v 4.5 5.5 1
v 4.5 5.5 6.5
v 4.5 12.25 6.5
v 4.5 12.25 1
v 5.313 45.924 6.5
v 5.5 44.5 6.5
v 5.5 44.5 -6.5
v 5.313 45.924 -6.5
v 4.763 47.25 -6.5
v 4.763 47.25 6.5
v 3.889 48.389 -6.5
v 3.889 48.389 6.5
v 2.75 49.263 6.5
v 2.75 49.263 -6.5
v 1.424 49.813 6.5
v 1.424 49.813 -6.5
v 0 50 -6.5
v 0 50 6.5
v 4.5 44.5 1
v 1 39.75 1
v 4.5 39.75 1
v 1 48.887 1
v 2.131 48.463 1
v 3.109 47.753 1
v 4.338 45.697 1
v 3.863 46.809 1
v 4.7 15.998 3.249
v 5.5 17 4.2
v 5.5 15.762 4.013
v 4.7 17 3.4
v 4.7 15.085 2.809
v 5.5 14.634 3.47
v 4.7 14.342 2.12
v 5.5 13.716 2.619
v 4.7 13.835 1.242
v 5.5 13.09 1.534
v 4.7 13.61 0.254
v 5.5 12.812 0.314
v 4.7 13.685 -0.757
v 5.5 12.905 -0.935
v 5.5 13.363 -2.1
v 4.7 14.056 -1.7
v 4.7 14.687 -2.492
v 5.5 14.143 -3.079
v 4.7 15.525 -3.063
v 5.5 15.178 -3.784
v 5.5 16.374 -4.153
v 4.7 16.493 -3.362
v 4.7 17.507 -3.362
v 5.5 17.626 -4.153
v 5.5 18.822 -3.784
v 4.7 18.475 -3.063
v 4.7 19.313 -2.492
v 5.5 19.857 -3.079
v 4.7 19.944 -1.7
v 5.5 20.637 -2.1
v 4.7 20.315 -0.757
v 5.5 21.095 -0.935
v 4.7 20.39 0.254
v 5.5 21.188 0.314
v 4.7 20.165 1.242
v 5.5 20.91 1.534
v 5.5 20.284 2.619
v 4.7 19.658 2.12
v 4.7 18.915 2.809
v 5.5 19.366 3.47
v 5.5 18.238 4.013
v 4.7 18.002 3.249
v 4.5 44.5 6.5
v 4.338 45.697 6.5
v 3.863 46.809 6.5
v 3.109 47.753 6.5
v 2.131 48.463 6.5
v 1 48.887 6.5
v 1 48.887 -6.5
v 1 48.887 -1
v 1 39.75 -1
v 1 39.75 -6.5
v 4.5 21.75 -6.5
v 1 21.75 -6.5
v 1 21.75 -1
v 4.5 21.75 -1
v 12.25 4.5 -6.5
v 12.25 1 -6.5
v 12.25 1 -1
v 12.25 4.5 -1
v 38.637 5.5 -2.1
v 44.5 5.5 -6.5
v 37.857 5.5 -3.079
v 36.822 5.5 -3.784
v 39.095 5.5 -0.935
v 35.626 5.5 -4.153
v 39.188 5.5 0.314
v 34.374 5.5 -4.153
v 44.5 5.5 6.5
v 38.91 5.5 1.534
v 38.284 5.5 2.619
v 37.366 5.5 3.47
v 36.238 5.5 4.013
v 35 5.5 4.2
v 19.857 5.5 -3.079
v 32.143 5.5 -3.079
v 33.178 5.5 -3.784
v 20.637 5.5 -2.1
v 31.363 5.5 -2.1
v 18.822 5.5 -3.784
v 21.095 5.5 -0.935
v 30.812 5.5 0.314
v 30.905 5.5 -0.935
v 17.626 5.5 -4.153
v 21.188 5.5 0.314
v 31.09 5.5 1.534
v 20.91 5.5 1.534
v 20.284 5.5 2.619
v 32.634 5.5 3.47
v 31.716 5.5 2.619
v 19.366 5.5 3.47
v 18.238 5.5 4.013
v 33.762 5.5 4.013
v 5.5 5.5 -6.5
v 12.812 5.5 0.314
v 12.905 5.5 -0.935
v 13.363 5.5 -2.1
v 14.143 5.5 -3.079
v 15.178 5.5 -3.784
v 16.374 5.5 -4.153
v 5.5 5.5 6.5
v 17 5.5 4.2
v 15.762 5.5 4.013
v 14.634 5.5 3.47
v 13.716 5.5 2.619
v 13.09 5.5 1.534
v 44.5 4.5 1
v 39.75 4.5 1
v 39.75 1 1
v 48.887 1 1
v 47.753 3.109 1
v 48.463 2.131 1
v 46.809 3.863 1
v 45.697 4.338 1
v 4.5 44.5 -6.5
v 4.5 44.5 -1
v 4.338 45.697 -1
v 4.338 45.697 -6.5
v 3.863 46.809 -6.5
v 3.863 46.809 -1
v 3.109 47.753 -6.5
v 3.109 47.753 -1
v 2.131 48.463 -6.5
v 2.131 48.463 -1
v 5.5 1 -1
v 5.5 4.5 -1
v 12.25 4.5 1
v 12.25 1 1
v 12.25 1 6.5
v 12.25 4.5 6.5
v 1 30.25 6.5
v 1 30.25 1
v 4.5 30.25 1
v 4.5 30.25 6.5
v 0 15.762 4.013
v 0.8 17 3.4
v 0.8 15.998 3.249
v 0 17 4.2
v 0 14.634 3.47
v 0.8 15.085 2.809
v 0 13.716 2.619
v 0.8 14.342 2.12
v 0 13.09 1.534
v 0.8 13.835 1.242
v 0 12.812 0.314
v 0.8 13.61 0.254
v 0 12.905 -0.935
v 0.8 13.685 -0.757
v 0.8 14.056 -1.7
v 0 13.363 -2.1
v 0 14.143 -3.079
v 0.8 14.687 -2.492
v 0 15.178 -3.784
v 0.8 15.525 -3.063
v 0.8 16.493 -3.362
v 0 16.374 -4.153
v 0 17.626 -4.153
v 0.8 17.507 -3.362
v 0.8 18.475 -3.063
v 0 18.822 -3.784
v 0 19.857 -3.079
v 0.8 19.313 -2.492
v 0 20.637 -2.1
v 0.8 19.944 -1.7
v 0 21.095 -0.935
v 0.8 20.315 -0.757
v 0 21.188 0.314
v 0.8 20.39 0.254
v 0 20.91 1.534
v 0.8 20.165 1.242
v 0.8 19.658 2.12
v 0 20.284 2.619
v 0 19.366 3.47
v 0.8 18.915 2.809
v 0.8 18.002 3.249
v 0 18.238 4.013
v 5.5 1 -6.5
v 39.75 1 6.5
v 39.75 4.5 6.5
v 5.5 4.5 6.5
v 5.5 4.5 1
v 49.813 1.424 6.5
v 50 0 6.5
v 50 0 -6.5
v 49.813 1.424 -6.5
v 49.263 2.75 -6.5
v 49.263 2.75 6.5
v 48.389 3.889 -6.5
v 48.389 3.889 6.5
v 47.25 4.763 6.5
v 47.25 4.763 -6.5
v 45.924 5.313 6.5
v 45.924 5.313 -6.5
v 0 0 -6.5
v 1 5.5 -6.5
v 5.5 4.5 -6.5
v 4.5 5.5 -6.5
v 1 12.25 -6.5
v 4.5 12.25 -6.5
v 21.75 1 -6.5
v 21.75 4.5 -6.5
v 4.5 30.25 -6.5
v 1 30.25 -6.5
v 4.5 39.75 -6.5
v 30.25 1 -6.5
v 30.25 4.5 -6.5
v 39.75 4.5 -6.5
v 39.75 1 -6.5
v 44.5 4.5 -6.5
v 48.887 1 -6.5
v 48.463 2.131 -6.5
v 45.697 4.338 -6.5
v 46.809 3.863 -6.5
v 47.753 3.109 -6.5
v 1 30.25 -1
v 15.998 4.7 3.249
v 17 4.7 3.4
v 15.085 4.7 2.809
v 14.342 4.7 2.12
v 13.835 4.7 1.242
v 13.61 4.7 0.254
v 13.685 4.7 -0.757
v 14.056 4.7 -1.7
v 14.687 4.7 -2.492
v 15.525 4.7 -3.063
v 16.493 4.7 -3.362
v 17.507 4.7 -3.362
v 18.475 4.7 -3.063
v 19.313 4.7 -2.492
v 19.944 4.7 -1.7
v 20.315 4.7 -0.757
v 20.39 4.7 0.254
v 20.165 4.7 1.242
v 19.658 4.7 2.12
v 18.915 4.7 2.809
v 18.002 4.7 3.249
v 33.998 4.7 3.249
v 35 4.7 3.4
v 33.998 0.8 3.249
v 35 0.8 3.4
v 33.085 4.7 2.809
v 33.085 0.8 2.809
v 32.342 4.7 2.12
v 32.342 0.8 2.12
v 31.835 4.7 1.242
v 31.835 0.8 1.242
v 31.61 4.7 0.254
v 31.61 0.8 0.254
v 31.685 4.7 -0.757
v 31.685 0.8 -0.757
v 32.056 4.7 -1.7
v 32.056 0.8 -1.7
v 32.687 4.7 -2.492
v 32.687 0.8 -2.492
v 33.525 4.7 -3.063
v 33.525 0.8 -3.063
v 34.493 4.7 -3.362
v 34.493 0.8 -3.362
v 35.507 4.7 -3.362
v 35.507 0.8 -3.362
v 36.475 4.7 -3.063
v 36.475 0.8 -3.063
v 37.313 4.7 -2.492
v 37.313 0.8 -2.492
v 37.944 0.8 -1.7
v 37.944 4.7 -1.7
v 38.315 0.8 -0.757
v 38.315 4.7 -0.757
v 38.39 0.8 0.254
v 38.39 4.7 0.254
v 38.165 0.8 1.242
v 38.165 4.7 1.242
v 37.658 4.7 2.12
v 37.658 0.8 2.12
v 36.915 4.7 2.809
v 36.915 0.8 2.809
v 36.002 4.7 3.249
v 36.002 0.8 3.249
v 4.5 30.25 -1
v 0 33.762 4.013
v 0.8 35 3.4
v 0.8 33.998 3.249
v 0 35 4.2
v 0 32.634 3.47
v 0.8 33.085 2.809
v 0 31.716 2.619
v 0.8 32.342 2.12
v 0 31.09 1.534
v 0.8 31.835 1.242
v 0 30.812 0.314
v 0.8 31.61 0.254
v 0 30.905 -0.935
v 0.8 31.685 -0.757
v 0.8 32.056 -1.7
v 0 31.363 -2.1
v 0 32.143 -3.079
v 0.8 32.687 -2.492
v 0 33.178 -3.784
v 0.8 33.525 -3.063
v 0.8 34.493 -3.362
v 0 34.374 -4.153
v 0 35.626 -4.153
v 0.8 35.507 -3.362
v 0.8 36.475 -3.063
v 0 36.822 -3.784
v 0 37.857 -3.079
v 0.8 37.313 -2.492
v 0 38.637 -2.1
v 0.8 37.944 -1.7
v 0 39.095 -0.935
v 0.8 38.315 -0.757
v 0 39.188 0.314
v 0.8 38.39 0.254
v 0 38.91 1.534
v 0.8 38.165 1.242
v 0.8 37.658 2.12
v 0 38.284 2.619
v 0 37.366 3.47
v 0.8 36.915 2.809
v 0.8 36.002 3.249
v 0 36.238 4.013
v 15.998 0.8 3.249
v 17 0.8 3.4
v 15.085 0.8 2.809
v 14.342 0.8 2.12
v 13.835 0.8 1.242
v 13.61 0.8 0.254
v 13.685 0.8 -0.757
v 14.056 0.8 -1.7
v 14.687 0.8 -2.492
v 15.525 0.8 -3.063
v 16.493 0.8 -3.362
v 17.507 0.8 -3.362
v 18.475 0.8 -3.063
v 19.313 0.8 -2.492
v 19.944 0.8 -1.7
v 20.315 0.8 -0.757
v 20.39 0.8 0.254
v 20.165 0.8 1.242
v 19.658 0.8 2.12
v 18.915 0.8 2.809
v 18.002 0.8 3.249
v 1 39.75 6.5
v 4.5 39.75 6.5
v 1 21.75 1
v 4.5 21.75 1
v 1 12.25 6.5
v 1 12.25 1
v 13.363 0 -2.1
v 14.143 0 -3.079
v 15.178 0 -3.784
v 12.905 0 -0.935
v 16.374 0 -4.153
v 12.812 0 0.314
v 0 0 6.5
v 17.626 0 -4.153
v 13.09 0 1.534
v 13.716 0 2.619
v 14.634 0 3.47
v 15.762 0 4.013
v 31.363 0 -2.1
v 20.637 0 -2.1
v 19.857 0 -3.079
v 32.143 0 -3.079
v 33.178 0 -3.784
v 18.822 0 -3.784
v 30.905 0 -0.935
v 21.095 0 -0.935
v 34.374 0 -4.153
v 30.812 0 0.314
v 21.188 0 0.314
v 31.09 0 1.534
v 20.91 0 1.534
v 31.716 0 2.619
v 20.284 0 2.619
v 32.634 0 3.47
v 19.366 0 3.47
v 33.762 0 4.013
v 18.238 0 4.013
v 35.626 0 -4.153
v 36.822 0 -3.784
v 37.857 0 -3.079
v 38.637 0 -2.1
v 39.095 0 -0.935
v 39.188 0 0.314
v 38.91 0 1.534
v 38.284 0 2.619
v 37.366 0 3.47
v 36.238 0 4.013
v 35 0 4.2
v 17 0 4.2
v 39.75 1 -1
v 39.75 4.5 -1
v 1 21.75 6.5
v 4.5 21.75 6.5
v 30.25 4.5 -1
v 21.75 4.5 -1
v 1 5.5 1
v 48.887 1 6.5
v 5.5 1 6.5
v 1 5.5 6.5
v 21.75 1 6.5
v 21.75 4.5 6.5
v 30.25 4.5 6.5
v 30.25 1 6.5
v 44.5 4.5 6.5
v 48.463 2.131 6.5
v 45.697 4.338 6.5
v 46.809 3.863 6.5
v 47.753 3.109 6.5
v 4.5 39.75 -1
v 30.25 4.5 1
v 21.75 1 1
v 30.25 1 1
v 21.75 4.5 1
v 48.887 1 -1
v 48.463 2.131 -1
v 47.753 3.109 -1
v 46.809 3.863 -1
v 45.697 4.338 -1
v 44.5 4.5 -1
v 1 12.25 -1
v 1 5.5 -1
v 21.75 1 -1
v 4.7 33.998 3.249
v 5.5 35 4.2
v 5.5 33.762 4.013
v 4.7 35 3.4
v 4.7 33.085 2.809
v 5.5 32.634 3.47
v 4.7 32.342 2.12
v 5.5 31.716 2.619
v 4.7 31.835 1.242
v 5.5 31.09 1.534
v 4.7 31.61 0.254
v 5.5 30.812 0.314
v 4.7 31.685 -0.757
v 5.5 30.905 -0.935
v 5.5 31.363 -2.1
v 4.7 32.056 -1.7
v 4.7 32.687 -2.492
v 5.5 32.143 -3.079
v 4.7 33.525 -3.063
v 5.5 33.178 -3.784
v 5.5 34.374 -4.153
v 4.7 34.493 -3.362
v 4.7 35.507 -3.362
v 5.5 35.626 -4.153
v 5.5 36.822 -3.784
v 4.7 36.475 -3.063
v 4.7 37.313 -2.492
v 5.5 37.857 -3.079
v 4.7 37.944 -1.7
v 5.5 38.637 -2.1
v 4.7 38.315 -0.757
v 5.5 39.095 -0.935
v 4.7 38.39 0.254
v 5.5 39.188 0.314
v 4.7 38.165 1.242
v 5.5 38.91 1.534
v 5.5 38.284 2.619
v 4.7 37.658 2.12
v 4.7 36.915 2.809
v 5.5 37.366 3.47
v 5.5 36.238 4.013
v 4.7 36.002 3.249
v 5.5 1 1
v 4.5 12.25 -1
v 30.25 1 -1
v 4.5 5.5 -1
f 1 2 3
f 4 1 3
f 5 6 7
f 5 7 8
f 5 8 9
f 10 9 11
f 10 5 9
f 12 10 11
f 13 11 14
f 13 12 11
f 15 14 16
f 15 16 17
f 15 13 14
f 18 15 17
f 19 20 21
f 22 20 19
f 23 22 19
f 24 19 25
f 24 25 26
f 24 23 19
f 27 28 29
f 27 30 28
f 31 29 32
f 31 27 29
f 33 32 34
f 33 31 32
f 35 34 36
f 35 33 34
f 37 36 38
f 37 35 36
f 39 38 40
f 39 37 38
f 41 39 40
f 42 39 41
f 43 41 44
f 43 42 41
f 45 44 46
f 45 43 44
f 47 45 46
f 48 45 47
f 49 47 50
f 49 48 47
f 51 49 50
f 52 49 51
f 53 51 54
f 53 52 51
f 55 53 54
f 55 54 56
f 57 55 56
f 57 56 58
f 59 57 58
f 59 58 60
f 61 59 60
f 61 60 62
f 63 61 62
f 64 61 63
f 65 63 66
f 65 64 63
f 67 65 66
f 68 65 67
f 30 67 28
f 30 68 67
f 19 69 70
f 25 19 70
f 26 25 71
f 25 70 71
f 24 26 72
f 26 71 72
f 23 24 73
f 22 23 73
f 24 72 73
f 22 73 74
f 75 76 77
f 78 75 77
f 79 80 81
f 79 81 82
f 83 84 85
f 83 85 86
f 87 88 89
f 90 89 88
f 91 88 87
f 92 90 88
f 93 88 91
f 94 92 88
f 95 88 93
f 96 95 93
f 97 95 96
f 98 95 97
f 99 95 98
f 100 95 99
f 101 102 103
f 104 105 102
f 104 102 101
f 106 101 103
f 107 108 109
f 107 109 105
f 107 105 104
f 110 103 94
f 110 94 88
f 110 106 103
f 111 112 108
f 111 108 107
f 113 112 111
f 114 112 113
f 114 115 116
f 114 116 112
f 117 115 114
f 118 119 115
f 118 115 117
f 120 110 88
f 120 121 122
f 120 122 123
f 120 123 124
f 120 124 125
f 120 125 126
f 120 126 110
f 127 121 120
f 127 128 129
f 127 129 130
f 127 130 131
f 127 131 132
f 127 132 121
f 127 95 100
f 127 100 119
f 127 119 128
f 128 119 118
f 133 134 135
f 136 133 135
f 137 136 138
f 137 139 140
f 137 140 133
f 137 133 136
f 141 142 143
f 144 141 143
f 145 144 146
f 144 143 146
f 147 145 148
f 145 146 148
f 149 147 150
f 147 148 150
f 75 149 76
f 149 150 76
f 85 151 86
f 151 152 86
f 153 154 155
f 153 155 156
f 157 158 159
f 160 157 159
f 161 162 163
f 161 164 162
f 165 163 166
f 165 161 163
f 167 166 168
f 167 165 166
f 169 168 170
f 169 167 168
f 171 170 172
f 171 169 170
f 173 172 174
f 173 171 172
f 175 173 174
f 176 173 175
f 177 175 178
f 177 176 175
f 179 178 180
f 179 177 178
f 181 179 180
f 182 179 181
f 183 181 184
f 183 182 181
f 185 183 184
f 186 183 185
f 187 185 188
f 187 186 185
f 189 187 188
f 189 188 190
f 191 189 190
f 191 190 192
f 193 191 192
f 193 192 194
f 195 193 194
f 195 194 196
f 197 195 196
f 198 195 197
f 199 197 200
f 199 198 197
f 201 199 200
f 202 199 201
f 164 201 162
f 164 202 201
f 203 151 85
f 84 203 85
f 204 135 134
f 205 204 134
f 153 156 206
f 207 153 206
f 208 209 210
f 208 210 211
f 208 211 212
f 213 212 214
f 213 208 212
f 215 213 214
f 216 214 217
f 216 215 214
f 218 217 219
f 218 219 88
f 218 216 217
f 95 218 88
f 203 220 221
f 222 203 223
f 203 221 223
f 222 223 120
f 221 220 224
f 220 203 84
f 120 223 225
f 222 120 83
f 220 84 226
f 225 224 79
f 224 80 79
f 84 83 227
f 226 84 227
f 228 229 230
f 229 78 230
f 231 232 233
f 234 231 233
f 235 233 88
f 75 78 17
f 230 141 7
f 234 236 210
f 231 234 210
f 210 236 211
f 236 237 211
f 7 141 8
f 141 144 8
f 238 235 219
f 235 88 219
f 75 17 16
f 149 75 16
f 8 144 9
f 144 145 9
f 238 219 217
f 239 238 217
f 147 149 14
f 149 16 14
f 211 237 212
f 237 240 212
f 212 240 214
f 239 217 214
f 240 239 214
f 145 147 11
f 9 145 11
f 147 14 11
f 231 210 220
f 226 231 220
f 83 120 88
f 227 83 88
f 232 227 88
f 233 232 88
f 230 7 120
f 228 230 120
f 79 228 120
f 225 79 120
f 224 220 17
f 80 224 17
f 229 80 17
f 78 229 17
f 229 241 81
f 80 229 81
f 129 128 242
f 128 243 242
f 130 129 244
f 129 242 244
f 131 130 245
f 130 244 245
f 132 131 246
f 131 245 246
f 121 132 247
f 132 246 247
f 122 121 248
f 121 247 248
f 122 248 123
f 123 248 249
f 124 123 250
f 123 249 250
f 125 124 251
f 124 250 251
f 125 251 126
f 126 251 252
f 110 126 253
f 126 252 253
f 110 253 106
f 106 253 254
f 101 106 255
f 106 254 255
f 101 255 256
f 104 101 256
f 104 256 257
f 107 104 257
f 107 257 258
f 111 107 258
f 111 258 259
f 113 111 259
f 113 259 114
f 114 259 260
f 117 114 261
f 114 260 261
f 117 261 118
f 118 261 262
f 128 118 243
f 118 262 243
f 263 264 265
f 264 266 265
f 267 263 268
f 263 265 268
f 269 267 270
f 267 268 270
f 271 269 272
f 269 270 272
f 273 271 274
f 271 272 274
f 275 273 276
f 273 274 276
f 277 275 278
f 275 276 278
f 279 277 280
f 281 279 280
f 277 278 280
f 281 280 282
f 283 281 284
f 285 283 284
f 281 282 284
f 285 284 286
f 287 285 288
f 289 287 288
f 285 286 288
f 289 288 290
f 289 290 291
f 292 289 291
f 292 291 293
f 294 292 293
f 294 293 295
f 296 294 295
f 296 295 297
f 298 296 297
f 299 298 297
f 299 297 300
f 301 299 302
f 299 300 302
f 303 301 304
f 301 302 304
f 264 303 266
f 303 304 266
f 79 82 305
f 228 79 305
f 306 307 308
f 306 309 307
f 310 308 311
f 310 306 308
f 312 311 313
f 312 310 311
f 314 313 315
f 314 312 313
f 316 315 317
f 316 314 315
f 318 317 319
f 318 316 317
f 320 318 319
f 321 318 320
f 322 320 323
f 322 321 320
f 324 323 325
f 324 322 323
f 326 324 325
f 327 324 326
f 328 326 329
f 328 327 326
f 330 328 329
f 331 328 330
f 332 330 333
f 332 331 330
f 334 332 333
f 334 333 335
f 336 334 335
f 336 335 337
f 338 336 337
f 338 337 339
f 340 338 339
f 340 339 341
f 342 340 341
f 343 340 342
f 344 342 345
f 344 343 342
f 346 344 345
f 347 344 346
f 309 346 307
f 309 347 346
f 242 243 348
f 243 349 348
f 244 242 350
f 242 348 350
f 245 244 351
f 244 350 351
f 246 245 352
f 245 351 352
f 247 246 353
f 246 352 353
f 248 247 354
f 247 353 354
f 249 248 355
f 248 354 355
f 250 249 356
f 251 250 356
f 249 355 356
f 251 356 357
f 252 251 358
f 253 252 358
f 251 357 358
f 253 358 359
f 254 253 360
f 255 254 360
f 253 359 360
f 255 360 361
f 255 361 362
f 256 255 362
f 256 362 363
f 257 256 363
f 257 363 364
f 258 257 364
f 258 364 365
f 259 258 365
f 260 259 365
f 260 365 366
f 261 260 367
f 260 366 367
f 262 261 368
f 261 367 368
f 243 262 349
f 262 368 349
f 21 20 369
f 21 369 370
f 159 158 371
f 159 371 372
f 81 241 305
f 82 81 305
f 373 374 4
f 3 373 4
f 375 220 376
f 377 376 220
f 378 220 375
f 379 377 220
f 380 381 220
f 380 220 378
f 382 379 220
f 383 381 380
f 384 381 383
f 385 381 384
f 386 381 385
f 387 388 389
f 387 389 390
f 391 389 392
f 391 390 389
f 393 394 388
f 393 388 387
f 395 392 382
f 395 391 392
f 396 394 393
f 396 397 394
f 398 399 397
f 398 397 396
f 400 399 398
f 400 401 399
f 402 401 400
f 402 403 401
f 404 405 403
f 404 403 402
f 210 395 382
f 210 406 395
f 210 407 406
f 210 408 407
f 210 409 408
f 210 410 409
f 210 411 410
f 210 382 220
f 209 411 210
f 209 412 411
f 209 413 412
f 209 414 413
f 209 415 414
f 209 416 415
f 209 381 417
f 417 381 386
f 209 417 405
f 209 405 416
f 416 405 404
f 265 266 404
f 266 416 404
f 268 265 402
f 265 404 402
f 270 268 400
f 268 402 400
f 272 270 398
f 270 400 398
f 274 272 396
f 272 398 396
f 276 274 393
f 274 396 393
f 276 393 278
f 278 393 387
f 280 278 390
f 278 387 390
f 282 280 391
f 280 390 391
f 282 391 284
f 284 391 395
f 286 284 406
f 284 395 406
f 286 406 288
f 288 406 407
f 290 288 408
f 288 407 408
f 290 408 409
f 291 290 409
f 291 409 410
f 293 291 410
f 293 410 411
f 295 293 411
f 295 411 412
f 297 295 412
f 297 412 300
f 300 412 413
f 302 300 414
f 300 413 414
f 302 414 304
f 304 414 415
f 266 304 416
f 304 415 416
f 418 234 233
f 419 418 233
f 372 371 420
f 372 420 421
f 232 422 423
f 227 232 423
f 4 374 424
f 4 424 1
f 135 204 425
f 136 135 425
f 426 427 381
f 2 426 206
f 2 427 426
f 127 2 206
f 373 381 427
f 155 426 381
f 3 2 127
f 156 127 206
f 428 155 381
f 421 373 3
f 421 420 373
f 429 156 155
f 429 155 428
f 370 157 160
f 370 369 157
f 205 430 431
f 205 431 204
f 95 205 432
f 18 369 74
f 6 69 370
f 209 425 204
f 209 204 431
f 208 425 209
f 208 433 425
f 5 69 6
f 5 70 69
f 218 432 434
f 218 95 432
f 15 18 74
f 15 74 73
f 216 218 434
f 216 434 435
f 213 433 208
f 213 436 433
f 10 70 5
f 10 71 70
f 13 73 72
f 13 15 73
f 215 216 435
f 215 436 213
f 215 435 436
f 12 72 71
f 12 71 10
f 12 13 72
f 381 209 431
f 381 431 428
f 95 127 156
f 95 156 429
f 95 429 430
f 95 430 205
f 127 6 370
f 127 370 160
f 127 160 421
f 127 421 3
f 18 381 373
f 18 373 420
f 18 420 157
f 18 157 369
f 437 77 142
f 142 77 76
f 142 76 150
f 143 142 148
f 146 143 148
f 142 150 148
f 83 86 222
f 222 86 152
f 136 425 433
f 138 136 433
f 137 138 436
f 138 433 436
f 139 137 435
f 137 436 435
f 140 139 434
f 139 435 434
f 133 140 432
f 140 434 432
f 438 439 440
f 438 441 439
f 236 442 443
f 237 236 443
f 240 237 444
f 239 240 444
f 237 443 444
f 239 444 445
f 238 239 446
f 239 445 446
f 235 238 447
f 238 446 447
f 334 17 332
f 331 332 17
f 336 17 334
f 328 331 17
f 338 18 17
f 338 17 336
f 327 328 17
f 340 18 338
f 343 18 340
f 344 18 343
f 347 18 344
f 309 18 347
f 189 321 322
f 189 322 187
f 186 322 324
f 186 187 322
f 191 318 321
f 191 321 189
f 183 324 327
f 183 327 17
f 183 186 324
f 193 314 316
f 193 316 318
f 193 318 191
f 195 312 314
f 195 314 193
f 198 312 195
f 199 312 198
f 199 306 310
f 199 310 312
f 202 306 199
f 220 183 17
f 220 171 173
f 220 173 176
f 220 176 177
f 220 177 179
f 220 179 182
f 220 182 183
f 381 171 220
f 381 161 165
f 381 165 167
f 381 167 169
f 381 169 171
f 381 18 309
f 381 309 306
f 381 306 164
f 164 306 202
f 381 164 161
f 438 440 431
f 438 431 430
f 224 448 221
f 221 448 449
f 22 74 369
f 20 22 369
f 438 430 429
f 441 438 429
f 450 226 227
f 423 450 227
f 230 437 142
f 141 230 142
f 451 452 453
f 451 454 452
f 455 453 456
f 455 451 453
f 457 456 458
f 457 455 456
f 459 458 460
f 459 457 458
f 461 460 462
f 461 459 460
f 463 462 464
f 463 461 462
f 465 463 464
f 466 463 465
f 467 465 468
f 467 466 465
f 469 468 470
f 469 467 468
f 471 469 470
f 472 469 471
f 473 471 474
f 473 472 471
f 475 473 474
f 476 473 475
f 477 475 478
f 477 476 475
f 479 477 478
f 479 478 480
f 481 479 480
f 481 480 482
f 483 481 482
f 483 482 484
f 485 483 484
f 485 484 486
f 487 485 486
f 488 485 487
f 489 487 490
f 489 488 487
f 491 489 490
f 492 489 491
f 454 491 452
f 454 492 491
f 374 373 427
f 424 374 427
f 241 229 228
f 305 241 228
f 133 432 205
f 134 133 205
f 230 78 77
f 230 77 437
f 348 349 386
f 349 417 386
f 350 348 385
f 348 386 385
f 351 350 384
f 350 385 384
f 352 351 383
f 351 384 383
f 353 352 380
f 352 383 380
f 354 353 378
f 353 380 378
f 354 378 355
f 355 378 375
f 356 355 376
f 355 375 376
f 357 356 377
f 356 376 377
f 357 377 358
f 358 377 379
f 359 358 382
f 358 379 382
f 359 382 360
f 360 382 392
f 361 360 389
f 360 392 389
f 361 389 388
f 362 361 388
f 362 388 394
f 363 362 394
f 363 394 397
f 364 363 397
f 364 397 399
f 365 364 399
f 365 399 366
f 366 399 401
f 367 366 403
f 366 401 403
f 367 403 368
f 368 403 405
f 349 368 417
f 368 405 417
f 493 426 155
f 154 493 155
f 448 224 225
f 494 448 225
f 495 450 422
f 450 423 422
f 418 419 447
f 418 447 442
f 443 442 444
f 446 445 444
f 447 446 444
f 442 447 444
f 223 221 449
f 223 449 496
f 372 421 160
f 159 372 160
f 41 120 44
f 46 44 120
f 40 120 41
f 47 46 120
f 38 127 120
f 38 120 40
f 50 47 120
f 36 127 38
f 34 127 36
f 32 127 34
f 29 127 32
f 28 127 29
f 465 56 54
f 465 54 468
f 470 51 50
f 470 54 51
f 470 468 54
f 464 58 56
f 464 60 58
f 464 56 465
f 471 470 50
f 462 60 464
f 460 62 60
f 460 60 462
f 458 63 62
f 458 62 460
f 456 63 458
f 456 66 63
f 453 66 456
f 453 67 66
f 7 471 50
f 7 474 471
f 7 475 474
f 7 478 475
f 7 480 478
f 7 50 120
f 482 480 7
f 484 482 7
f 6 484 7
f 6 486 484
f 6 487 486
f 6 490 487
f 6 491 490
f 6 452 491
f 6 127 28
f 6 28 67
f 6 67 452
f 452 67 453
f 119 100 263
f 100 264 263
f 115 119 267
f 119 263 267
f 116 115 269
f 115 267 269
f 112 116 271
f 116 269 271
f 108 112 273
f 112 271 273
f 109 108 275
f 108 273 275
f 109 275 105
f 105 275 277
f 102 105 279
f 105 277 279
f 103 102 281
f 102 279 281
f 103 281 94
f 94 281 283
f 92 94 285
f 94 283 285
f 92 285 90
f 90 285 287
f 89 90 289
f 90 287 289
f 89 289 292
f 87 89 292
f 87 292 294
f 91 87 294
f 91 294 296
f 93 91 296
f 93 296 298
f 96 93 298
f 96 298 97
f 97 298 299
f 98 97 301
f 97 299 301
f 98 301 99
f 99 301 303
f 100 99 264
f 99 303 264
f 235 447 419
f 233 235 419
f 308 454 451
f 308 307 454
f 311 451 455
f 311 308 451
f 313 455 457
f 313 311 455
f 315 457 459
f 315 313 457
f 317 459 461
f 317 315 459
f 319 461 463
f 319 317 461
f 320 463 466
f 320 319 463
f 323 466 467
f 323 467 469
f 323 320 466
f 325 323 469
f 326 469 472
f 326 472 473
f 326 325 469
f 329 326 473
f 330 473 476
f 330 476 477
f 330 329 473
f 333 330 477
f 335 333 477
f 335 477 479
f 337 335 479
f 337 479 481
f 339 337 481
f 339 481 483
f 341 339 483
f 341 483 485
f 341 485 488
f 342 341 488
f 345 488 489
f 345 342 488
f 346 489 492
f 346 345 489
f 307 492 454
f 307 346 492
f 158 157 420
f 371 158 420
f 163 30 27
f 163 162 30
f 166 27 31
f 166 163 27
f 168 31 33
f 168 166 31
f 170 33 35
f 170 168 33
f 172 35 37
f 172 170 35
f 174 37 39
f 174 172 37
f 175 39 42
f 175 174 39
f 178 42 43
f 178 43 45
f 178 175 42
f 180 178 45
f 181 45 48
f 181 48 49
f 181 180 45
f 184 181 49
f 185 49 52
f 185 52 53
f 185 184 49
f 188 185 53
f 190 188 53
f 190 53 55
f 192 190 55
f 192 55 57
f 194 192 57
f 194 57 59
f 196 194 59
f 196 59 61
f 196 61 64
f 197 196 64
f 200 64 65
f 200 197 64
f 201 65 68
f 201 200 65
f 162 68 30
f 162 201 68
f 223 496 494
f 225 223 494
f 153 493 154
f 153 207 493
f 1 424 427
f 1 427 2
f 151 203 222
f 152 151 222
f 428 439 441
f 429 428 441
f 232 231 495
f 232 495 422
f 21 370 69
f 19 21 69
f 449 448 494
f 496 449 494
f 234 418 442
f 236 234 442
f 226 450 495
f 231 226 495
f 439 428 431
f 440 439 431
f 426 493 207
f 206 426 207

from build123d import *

# Parameters (mm, degrees)
EXTRUDE_1_DEPTH            = 6.5
EXTRUDE_START              = -6.5
SKETCH_2_W                 = 5.5
SKETCH_2_H                 = 5.5
SKETCH_2_H_2               = 9.5
SKETCH_2_W_2               = 9.5
EXTRUDE_2_DEPTH            = 13
EXTRUDE_3_DEPTH            = 1
HOLE_WIZARD_M81_AT_2_COUNT = 2
HOLE_WIZARD_M81_AT_2_PITCH = 18


with BuildPart() as part:
    # Эскиз1 → Бобышка-Вытянуть1 (new body, symmetric)
    with BuildSketch(Plane.XY):
        with BuildLine():
            Line((0, 50), (0, 0))
            Line((0, 0), (50, 0))
            ThreePointArc((50, 0), (48.389087297, 3.889087297), (44.5, 5.5))
            Line((44.5, 5.5), (5.5, 5.5))
            Line((5.5, 5.5), (5.5, 44.5))
            ThreePointArc((5.5, 44.5), (3.889087297, 48.389087297), (0, 50))
        make_face()
        with BuildLine():
            Line((1, 48.887482194), (1, 1))
            Line((1, 1), (48.887482194, 1))
            ThreePointArc((48.887482194, 1), (47.30624304, 3.51781182), (44.5, 4.5))
            Line((44.5, 4.5), (4.5, 4.5))
            Line((4.5, 4.5), (4.5, 44.5))
            ThreePointArc((4.5, 44.5), (3.51781182, 47.30624304), (1, 48.887482194))
        make_face(mode=Mode.SUBTRACT)
    extrude(amount=EXTRUDE_1_DEPTH, both=True)

    # Эскиз2 → Бобышка-Вытянуть2 (add)
    with BuildSketch(Plane.XY.offset(EXTRUDE_START)):
        with Locations((2.75, 2.75)):
            Rectangle(SKETCH_2_W, SKETCH_2_H)
        with Locations((2.75, 35)):
            Rectangle(SKETCH_2_W, SKETCH_2_H_2)
        with Locations((2.75, 17)):
            Rectangle(SKETCH_2_W, SKETCH_2_H_2)
        with Locations((17, 2.75)):
            Rectangle(SKETCH_2_W_2, SKETCH_2_H)
        with Locations((35, 2.75)):
            Rectangle(SKETCH_2_W_2, SKETCH_2_H)
    extrude(amount=EXTRUDE_2_DEPTH)

    # Эскиз3 → Бобышка-Вытянуть3 (add, symmetric)
    with BuildSketch(Plane.XY):
        with BuildLine():
            Line((0, 0), (50, 0))
            ThreePointArc((50, 0), (48.389087297, 3.889087297), (44.5, 5.5))
            Line((44.5, 5.5), (5.5, 5.5))
            Line((5.5, 5.5), (5.5, 44.5))
            ThreePointArc((5.5, 44.5), (3.889087297, 48.389087297), (0, 50))
            Line((0, 50), (0, 0))
        make_face()
    extrude(amount=EXTRUDE_3_DEPTH, both=True)

    # Эскиз5 → Отверстие обработанное метчиком M81 (revolve, cut)
    with BuildSketch(Plane.ZX.offset(35)):
        Polygon((0, 0), (0, 5.5), (4.2, 5.5), (3.4, 4.7), (3.4, 0.8), (4.2, 0), align=None)
    hole_wizard_m81 = revolve(axis=Axis((-6.35, 35, 0), (1, 0, 0)), mode=Mode.SUBTRACT)

    # Отверстие обработанное метчиком M81 at 2: Отверстие обработанное метчиком M81 ×2
    with Locations(*[(0, -i * HOLE_WIZARD_M81_AT_2_PITCH, 0) for i in range(1, HOLE_WIZARD_M81_AT_2_COUNT)]):
        add(hole_wizard_m81, mode=Mode.SUBTRACT)

    # Зеркальное отражение1: Отверстие обработанное метчиком M81 across plane
    add(hole_wizard_m81.mirror(Plane(origin=(0, 0, 0), x_dir=(0, 0, 1), z_dir=(-0.707106781, 0.707106781, 0))), mode=Mode.SUBTRACT)

    # Зеркальное отражение1 copy 1 sketch → Зеркальное отражение1 copy 1 (revolve, cut)
    with BuildSketch(Plane(origin=(17, 0, 0), x_dir=(0, 0, 1), z_dir=(1, 0, 0))):
        Polygon((0, 0), (0, -5.5), (4.2, -5.5), (3.4, -4.7), (3.4, -0.8), (4.2, 0), align=None)
    revolve(axis=Axis((17, -6.35, 0), (0, -1, 0)), mode=Mode.SUBTRACT)


solid = part.part
